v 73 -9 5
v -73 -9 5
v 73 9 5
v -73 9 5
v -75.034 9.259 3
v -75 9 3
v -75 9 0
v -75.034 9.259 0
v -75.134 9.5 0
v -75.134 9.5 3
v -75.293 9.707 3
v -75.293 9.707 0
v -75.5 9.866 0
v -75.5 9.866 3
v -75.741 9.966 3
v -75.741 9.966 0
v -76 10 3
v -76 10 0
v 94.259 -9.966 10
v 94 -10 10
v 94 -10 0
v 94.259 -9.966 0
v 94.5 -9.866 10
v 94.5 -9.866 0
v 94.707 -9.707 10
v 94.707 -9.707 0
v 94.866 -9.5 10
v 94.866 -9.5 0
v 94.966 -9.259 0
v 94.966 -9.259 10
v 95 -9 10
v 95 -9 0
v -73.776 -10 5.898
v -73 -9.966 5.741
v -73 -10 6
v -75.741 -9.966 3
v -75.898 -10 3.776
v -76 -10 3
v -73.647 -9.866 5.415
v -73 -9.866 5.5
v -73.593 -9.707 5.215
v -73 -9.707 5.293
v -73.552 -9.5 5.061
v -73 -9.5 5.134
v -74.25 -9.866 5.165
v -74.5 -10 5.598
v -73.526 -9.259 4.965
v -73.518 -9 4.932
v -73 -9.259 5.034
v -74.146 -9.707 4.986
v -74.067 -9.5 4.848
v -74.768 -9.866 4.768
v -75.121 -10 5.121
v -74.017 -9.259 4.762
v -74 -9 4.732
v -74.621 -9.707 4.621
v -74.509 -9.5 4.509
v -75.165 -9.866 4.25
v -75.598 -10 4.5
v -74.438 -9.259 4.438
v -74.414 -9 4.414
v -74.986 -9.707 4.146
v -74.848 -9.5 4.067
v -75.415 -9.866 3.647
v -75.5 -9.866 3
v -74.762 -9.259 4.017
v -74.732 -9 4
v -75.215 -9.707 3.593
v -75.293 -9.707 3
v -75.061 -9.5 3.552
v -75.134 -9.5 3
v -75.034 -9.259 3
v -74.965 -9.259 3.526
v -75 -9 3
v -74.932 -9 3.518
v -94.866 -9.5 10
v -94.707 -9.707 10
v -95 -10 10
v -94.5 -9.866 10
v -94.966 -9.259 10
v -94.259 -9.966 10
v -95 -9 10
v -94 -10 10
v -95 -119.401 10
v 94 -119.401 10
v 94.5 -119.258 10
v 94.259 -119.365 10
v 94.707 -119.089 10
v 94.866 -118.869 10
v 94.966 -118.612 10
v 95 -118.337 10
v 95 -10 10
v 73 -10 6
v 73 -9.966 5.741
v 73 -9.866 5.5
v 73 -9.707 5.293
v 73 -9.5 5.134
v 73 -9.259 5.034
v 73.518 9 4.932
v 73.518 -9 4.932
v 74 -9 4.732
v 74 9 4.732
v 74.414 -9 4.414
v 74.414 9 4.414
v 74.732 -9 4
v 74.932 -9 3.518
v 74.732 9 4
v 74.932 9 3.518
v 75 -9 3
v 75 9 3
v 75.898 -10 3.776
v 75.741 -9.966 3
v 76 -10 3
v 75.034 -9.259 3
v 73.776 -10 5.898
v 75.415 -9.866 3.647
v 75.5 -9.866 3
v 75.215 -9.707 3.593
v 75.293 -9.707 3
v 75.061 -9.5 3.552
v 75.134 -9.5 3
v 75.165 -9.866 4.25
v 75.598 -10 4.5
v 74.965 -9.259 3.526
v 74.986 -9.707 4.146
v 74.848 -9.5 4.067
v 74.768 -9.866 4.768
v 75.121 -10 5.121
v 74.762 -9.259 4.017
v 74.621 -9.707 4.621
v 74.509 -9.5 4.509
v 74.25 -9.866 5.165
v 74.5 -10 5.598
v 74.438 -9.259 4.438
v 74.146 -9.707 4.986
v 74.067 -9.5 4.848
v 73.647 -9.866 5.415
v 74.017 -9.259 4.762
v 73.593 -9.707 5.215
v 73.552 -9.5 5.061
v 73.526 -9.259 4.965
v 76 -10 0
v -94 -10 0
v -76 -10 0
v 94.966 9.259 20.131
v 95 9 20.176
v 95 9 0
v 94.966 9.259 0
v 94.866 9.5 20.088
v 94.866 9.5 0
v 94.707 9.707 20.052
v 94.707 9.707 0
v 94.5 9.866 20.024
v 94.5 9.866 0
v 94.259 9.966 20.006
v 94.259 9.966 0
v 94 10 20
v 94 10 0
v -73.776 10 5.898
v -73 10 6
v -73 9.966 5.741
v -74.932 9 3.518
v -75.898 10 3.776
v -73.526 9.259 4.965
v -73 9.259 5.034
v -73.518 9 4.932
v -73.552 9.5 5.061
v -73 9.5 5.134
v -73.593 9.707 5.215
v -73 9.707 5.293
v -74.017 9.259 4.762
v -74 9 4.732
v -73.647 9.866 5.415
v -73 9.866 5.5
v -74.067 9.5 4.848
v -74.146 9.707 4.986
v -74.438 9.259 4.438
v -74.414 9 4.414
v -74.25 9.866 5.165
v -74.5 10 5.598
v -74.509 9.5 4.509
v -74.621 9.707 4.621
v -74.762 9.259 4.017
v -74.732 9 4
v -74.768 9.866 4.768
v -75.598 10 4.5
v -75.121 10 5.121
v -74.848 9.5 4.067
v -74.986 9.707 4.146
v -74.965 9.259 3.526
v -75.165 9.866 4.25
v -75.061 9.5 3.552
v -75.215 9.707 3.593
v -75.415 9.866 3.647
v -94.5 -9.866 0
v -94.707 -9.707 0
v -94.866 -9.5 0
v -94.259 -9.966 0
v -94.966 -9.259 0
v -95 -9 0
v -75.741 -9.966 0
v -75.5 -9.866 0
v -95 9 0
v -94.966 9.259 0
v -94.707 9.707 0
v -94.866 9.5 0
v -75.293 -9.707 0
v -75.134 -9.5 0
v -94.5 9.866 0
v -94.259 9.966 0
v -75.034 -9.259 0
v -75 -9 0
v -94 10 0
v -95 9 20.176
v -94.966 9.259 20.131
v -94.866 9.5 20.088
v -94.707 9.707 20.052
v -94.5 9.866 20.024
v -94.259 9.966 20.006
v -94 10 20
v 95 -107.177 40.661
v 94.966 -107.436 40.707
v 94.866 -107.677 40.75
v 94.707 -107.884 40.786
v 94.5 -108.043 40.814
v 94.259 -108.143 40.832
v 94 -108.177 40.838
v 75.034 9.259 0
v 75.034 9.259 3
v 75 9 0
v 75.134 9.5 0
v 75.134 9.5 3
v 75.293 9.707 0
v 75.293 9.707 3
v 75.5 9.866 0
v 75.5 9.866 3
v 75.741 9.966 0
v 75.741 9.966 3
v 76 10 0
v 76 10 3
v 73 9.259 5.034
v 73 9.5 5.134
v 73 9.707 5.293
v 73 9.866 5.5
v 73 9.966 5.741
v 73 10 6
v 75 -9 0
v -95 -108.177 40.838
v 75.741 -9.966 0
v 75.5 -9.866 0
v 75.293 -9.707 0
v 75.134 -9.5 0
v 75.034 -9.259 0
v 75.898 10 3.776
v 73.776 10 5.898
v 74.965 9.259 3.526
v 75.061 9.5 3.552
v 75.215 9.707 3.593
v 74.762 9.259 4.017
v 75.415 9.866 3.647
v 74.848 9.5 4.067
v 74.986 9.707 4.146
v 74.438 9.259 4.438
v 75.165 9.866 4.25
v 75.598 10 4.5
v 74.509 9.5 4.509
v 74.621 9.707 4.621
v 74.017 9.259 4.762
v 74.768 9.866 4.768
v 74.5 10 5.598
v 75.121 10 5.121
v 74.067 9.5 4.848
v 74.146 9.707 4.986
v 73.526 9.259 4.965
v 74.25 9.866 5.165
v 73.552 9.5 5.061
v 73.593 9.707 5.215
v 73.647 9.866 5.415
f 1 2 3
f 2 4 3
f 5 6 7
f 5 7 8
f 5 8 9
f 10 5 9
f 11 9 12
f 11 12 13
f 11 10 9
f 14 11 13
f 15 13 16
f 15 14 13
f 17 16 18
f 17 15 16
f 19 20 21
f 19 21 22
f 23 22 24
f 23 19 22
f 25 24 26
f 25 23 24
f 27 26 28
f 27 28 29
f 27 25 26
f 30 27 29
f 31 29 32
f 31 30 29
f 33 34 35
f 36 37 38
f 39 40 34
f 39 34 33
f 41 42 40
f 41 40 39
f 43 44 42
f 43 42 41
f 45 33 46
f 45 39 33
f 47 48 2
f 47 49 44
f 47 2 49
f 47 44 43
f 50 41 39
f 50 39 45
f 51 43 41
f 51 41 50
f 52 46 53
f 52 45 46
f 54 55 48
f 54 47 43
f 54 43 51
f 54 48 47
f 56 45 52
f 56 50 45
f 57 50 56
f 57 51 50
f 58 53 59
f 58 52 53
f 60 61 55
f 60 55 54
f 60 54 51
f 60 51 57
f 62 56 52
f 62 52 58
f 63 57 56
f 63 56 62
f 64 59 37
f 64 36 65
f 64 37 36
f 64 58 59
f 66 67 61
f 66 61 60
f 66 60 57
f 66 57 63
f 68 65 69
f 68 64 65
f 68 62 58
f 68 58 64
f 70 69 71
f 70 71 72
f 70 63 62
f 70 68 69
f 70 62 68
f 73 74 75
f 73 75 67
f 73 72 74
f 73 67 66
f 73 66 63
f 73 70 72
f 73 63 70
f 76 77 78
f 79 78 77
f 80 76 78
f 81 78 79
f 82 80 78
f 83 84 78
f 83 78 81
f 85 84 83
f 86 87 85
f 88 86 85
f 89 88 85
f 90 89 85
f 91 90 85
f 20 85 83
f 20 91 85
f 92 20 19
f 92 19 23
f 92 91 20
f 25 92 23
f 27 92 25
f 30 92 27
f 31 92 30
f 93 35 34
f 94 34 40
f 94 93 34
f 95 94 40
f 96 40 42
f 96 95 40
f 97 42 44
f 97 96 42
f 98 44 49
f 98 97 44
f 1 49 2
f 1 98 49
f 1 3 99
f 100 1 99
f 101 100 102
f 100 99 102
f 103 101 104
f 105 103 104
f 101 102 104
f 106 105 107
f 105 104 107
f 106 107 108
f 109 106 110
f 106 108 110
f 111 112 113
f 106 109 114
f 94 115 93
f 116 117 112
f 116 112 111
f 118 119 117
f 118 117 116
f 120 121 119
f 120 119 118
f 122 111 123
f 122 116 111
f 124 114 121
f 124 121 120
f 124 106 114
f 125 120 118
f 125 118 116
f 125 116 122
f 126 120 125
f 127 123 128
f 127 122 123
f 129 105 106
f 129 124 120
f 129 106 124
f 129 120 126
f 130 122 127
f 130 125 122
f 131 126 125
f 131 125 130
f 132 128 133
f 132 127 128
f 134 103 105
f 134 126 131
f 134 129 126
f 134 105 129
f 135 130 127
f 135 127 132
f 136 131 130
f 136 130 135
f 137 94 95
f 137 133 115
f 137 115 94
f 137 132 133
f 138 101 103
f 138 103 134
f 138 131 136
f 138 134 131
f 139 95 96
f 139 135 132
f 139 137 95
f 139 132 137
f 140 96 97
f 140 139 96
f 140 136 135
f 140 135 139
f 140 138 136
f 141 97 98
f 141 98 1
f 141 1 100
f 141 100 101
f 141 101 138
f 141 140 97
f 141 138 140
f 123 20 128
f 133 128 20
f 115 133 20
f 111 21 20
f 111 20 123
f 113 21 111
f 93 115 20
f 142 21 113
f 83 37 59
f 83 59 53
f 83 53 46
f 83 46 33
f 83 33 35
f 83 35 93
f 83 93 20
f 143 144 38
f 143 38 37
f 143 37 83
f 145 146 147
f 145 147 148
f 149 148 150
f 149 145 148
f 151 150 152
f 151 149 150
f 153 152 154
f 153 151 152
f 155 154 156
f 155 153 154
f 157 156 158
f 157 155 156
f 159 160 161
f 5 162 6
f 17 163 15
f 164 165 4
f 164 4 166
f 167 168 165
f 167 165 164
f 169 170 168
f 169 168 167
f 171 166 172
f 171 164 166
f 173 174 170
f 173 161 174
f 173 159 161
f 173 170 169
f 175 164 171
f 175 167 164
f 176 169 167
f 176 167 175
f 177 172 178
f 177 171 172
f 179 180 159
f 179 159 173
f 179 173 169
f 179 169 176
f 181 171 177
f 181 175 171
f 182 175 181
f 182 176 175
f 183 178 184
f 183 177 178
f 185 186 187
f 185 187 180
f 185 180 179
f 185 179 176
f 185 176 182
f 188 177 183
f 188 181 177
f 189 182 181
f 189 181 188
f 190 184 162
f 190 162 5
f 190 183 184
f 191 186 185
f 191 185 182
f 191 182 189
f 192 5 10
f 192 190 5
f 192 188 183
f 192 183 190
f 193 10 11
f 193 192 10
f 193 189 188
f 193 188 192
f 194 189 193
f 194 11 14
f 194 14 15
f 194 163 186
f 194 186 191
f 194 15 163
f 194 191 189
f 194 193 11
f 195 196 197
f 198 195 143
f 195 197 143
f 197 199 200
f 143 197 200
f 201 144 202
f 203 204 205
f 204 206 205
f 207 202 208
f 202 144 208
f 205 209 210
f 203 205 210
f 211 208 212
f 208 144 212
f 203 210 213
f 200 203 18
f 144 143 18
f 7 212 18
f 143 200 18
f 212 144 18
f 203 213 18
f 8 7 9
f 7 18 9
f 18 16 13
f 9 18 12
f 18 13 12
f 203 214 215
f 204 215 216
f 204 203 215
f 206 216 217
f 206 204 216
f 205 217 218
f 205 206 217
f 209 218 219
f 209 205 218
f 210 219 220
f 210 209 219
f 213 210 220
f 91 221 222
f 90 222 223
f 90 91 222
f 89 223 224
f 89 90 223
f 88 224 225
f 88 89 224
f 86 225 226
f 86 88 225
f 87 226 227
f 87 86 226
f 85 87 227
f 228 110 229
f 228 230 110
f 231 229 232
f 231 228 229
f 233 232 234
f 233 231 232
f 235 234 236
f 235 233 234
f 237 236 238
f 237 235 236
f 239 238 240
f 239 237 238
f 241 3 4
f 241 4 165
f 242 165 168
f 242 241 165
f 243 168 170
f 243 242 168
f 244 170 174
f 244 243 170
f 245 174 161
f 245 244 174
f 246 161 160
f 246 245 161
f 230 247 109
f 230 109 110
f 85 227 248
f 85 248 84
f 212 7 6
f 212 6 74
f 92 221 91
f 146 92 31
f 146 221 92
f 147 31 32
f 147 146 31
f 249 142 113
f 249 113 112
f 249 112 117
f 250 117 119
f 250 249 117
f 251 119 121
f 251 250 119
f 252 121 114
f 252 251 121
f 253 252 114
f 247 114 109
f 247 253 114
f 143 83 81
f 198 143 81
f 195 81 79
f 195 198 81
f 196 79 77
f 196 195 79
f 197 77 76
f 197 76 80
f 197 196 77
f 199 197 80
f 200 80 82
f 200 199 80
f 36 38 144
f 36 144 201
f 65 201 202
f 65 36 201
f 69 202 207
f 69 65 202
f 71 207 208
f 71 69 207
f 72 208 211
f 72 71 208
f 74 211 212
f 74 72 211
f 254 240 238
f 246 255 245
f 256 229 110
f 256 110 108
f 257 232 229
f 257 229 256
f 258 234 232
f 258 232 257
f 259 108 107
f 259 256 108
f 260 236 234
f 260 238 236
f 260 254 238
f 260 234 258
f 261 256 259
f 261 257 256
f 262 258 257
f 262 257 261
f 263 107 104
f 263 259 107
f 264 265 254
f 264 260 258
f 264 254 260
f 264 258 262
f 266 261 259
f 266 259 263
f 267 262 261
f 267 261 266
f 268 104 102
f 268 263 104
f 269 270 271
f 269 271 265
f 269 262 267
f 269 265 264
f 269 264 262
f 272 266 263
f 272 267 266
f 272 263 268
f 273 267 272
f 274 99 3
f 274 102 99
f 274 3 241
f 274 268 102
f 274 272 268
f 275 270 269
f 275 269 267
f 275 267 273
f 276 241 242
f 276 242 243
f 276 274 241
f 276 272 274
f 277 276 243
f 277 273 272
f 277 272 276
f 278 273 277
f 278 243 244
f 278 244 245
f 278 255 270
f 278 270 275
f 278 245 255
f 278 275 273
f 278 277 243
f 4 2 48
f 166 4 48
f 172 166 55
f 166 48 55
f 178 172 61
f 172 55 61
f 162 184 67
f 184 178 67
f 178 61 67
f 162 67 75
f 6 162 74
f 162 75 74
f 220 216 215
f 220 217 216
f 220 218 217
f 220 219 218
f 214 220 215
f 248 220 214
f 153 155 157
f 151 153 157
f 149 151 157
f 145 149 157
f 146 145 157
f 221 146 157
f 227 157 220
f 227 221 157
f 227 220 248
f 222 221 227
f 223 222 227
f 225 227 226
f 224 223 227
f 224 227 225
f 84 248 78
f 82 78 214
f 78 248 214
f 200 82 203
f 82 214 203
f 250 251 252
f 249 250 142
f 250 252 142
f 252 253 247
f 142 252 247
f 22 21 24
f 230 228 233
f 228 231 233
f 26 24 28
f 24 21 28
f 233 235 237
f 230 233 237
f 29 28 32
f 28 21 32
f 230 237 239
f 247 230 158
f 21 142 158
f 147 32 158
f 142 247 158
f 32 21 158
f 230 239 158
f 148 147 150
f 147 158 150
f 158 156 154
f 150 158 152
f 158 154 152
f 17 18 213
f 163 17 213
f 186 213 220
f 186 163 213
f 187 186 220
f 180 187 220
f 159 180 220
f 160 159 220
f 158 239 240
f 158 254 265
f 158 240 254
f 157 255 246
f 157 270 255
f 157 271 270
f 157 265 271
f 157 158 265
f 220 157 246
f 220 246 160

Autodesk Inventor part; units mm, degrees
ref_plane "YZ Plane" through (0, 0, 0) normal (1, 0, 0) x (0, 1, 0)
ref_plane "XZ Plane" through (0, 0, 0) normal (0, 1, 0) x (-1, 0, 0)
sketch "Sketch1" plane through (0, 0, 0) normal (0, 0, 1) x (1, 0, 0)
  line L0 (-75, -10) -> (-95, -10)
  line L1 (-95, -10) -> (-95, 10)
  line L2 (-95, 10) -> (-75, 10)
  line L3 (-75, 10) -> (-75, -10)
  line L4 (-75, -10) -> (-95, 10) construction
  line L5 (-95, -10) -> (-75, 10) construction
  line L6 (95, -10) -> (75, -10)
  line L7 (75, -10) -> (75, 10)
  line L8 (75, 10) -> (95, 10)
  line L9 (95, 10) -> (95, -10)
  line L10 (95, -10) -> (75, 10) construction
  line L11 (75, -10) -> (95, 10) construction
  line L12 (-85, 0) -> (85, 0) construction
  point P0 (0, 0)
  point P1 (0, 0)
  dimension "d0" = 20
  dimension "d1" = 20
  dimension "d2" = 20
  dimension "d3" = 20
  dimension "d4" = 170
extrude "Extrusion1" add sketch "Sketch1" along normal blind 5
sketch "Sketch2" plane through (0, 0, 5) normal (0, 0, 1) x (1, 0, 0)
  line L0 (-75, 10) -> (-95, 10) projected
  line L1 (-95, 10) -> (-95, -10) projected
  line L2 (-95, -10) -> (-75, -10) projected
  line L3 (-75, -10) -> (-75, 10) projected
  line L4 (95, 10) -> (75, 10) projected
  line L5 (75, 10) -> (75, -10) projected
  line L6 (75, -10) -> (95, -10) projected
  line L7 (95, -10) -> (95, 10) projected
  line L8 (-95, 10) -> (95, 10)
  line L9 (95, 10) -> (95, -10)
  line L10 (95, -10) -> (-95, -10)
  line L11 (-95, -10) -> (-95, 10)
  point P0 (0, 0)
extrude "Extrusion2" add sketch "Sketch2" along normal blind 5
ref_plane "Work Plane1" through (75, 5.75, 0) normal (0, 1, 0) x (1, 0, 0)
sketch "Sketch4" plane through (95, -10, 0) normal (1, 0, 0) x (0, 0, -1)
  line L0 (0, 0) -> (0, 20) projected
  line L1 (0, 20) -> (-10, 20) projected
  line L2 (-10, 0) -> (-10, 20) projected
  line L3 (0, 0) -> (-10, 0) projected
  line L4 (-10, 20) -> (-20, 20)
  line L5 (-20, 20) -> (-40.8378, -98.1769)
  line L6 (-40.8378, -98.1769) -> (-10, -109.401)
  line L7 (0, 0) -> (0, 20) projected
  line L8 (-10, -109.401) -> (-10, 0)
  line L9 (-10, 0) -> (-10, 20) projected
  point P0 (0, 10)
  dimension "d14" = 100
  dimension "d15" = 100
  dimension "d16" = 120
  dimension "d17" = 20
extrude "Extrusion4" add sketch "Sketch4" against normal up to surface (190 mm away) contours L8 L6 L5 L4 L2
fillet "Fillet1" radius 2 2 edges at (-75, 0, 5) (75, 0, 5)
fillet "Fillet2" radius 1 9 edges at (-75, 10, 1.5) (75, 10, 1.5) (-75, -10, 1.5) (75, -10, 1.5) (95, -10, 5) (95, 10, 10) (-95, 10, 10) (-95, -10, 5) (95, -113.7889, 25.4189)
equation "\"d15\" = d14"
properties part number "Display Case" material "ABS Plastic"
